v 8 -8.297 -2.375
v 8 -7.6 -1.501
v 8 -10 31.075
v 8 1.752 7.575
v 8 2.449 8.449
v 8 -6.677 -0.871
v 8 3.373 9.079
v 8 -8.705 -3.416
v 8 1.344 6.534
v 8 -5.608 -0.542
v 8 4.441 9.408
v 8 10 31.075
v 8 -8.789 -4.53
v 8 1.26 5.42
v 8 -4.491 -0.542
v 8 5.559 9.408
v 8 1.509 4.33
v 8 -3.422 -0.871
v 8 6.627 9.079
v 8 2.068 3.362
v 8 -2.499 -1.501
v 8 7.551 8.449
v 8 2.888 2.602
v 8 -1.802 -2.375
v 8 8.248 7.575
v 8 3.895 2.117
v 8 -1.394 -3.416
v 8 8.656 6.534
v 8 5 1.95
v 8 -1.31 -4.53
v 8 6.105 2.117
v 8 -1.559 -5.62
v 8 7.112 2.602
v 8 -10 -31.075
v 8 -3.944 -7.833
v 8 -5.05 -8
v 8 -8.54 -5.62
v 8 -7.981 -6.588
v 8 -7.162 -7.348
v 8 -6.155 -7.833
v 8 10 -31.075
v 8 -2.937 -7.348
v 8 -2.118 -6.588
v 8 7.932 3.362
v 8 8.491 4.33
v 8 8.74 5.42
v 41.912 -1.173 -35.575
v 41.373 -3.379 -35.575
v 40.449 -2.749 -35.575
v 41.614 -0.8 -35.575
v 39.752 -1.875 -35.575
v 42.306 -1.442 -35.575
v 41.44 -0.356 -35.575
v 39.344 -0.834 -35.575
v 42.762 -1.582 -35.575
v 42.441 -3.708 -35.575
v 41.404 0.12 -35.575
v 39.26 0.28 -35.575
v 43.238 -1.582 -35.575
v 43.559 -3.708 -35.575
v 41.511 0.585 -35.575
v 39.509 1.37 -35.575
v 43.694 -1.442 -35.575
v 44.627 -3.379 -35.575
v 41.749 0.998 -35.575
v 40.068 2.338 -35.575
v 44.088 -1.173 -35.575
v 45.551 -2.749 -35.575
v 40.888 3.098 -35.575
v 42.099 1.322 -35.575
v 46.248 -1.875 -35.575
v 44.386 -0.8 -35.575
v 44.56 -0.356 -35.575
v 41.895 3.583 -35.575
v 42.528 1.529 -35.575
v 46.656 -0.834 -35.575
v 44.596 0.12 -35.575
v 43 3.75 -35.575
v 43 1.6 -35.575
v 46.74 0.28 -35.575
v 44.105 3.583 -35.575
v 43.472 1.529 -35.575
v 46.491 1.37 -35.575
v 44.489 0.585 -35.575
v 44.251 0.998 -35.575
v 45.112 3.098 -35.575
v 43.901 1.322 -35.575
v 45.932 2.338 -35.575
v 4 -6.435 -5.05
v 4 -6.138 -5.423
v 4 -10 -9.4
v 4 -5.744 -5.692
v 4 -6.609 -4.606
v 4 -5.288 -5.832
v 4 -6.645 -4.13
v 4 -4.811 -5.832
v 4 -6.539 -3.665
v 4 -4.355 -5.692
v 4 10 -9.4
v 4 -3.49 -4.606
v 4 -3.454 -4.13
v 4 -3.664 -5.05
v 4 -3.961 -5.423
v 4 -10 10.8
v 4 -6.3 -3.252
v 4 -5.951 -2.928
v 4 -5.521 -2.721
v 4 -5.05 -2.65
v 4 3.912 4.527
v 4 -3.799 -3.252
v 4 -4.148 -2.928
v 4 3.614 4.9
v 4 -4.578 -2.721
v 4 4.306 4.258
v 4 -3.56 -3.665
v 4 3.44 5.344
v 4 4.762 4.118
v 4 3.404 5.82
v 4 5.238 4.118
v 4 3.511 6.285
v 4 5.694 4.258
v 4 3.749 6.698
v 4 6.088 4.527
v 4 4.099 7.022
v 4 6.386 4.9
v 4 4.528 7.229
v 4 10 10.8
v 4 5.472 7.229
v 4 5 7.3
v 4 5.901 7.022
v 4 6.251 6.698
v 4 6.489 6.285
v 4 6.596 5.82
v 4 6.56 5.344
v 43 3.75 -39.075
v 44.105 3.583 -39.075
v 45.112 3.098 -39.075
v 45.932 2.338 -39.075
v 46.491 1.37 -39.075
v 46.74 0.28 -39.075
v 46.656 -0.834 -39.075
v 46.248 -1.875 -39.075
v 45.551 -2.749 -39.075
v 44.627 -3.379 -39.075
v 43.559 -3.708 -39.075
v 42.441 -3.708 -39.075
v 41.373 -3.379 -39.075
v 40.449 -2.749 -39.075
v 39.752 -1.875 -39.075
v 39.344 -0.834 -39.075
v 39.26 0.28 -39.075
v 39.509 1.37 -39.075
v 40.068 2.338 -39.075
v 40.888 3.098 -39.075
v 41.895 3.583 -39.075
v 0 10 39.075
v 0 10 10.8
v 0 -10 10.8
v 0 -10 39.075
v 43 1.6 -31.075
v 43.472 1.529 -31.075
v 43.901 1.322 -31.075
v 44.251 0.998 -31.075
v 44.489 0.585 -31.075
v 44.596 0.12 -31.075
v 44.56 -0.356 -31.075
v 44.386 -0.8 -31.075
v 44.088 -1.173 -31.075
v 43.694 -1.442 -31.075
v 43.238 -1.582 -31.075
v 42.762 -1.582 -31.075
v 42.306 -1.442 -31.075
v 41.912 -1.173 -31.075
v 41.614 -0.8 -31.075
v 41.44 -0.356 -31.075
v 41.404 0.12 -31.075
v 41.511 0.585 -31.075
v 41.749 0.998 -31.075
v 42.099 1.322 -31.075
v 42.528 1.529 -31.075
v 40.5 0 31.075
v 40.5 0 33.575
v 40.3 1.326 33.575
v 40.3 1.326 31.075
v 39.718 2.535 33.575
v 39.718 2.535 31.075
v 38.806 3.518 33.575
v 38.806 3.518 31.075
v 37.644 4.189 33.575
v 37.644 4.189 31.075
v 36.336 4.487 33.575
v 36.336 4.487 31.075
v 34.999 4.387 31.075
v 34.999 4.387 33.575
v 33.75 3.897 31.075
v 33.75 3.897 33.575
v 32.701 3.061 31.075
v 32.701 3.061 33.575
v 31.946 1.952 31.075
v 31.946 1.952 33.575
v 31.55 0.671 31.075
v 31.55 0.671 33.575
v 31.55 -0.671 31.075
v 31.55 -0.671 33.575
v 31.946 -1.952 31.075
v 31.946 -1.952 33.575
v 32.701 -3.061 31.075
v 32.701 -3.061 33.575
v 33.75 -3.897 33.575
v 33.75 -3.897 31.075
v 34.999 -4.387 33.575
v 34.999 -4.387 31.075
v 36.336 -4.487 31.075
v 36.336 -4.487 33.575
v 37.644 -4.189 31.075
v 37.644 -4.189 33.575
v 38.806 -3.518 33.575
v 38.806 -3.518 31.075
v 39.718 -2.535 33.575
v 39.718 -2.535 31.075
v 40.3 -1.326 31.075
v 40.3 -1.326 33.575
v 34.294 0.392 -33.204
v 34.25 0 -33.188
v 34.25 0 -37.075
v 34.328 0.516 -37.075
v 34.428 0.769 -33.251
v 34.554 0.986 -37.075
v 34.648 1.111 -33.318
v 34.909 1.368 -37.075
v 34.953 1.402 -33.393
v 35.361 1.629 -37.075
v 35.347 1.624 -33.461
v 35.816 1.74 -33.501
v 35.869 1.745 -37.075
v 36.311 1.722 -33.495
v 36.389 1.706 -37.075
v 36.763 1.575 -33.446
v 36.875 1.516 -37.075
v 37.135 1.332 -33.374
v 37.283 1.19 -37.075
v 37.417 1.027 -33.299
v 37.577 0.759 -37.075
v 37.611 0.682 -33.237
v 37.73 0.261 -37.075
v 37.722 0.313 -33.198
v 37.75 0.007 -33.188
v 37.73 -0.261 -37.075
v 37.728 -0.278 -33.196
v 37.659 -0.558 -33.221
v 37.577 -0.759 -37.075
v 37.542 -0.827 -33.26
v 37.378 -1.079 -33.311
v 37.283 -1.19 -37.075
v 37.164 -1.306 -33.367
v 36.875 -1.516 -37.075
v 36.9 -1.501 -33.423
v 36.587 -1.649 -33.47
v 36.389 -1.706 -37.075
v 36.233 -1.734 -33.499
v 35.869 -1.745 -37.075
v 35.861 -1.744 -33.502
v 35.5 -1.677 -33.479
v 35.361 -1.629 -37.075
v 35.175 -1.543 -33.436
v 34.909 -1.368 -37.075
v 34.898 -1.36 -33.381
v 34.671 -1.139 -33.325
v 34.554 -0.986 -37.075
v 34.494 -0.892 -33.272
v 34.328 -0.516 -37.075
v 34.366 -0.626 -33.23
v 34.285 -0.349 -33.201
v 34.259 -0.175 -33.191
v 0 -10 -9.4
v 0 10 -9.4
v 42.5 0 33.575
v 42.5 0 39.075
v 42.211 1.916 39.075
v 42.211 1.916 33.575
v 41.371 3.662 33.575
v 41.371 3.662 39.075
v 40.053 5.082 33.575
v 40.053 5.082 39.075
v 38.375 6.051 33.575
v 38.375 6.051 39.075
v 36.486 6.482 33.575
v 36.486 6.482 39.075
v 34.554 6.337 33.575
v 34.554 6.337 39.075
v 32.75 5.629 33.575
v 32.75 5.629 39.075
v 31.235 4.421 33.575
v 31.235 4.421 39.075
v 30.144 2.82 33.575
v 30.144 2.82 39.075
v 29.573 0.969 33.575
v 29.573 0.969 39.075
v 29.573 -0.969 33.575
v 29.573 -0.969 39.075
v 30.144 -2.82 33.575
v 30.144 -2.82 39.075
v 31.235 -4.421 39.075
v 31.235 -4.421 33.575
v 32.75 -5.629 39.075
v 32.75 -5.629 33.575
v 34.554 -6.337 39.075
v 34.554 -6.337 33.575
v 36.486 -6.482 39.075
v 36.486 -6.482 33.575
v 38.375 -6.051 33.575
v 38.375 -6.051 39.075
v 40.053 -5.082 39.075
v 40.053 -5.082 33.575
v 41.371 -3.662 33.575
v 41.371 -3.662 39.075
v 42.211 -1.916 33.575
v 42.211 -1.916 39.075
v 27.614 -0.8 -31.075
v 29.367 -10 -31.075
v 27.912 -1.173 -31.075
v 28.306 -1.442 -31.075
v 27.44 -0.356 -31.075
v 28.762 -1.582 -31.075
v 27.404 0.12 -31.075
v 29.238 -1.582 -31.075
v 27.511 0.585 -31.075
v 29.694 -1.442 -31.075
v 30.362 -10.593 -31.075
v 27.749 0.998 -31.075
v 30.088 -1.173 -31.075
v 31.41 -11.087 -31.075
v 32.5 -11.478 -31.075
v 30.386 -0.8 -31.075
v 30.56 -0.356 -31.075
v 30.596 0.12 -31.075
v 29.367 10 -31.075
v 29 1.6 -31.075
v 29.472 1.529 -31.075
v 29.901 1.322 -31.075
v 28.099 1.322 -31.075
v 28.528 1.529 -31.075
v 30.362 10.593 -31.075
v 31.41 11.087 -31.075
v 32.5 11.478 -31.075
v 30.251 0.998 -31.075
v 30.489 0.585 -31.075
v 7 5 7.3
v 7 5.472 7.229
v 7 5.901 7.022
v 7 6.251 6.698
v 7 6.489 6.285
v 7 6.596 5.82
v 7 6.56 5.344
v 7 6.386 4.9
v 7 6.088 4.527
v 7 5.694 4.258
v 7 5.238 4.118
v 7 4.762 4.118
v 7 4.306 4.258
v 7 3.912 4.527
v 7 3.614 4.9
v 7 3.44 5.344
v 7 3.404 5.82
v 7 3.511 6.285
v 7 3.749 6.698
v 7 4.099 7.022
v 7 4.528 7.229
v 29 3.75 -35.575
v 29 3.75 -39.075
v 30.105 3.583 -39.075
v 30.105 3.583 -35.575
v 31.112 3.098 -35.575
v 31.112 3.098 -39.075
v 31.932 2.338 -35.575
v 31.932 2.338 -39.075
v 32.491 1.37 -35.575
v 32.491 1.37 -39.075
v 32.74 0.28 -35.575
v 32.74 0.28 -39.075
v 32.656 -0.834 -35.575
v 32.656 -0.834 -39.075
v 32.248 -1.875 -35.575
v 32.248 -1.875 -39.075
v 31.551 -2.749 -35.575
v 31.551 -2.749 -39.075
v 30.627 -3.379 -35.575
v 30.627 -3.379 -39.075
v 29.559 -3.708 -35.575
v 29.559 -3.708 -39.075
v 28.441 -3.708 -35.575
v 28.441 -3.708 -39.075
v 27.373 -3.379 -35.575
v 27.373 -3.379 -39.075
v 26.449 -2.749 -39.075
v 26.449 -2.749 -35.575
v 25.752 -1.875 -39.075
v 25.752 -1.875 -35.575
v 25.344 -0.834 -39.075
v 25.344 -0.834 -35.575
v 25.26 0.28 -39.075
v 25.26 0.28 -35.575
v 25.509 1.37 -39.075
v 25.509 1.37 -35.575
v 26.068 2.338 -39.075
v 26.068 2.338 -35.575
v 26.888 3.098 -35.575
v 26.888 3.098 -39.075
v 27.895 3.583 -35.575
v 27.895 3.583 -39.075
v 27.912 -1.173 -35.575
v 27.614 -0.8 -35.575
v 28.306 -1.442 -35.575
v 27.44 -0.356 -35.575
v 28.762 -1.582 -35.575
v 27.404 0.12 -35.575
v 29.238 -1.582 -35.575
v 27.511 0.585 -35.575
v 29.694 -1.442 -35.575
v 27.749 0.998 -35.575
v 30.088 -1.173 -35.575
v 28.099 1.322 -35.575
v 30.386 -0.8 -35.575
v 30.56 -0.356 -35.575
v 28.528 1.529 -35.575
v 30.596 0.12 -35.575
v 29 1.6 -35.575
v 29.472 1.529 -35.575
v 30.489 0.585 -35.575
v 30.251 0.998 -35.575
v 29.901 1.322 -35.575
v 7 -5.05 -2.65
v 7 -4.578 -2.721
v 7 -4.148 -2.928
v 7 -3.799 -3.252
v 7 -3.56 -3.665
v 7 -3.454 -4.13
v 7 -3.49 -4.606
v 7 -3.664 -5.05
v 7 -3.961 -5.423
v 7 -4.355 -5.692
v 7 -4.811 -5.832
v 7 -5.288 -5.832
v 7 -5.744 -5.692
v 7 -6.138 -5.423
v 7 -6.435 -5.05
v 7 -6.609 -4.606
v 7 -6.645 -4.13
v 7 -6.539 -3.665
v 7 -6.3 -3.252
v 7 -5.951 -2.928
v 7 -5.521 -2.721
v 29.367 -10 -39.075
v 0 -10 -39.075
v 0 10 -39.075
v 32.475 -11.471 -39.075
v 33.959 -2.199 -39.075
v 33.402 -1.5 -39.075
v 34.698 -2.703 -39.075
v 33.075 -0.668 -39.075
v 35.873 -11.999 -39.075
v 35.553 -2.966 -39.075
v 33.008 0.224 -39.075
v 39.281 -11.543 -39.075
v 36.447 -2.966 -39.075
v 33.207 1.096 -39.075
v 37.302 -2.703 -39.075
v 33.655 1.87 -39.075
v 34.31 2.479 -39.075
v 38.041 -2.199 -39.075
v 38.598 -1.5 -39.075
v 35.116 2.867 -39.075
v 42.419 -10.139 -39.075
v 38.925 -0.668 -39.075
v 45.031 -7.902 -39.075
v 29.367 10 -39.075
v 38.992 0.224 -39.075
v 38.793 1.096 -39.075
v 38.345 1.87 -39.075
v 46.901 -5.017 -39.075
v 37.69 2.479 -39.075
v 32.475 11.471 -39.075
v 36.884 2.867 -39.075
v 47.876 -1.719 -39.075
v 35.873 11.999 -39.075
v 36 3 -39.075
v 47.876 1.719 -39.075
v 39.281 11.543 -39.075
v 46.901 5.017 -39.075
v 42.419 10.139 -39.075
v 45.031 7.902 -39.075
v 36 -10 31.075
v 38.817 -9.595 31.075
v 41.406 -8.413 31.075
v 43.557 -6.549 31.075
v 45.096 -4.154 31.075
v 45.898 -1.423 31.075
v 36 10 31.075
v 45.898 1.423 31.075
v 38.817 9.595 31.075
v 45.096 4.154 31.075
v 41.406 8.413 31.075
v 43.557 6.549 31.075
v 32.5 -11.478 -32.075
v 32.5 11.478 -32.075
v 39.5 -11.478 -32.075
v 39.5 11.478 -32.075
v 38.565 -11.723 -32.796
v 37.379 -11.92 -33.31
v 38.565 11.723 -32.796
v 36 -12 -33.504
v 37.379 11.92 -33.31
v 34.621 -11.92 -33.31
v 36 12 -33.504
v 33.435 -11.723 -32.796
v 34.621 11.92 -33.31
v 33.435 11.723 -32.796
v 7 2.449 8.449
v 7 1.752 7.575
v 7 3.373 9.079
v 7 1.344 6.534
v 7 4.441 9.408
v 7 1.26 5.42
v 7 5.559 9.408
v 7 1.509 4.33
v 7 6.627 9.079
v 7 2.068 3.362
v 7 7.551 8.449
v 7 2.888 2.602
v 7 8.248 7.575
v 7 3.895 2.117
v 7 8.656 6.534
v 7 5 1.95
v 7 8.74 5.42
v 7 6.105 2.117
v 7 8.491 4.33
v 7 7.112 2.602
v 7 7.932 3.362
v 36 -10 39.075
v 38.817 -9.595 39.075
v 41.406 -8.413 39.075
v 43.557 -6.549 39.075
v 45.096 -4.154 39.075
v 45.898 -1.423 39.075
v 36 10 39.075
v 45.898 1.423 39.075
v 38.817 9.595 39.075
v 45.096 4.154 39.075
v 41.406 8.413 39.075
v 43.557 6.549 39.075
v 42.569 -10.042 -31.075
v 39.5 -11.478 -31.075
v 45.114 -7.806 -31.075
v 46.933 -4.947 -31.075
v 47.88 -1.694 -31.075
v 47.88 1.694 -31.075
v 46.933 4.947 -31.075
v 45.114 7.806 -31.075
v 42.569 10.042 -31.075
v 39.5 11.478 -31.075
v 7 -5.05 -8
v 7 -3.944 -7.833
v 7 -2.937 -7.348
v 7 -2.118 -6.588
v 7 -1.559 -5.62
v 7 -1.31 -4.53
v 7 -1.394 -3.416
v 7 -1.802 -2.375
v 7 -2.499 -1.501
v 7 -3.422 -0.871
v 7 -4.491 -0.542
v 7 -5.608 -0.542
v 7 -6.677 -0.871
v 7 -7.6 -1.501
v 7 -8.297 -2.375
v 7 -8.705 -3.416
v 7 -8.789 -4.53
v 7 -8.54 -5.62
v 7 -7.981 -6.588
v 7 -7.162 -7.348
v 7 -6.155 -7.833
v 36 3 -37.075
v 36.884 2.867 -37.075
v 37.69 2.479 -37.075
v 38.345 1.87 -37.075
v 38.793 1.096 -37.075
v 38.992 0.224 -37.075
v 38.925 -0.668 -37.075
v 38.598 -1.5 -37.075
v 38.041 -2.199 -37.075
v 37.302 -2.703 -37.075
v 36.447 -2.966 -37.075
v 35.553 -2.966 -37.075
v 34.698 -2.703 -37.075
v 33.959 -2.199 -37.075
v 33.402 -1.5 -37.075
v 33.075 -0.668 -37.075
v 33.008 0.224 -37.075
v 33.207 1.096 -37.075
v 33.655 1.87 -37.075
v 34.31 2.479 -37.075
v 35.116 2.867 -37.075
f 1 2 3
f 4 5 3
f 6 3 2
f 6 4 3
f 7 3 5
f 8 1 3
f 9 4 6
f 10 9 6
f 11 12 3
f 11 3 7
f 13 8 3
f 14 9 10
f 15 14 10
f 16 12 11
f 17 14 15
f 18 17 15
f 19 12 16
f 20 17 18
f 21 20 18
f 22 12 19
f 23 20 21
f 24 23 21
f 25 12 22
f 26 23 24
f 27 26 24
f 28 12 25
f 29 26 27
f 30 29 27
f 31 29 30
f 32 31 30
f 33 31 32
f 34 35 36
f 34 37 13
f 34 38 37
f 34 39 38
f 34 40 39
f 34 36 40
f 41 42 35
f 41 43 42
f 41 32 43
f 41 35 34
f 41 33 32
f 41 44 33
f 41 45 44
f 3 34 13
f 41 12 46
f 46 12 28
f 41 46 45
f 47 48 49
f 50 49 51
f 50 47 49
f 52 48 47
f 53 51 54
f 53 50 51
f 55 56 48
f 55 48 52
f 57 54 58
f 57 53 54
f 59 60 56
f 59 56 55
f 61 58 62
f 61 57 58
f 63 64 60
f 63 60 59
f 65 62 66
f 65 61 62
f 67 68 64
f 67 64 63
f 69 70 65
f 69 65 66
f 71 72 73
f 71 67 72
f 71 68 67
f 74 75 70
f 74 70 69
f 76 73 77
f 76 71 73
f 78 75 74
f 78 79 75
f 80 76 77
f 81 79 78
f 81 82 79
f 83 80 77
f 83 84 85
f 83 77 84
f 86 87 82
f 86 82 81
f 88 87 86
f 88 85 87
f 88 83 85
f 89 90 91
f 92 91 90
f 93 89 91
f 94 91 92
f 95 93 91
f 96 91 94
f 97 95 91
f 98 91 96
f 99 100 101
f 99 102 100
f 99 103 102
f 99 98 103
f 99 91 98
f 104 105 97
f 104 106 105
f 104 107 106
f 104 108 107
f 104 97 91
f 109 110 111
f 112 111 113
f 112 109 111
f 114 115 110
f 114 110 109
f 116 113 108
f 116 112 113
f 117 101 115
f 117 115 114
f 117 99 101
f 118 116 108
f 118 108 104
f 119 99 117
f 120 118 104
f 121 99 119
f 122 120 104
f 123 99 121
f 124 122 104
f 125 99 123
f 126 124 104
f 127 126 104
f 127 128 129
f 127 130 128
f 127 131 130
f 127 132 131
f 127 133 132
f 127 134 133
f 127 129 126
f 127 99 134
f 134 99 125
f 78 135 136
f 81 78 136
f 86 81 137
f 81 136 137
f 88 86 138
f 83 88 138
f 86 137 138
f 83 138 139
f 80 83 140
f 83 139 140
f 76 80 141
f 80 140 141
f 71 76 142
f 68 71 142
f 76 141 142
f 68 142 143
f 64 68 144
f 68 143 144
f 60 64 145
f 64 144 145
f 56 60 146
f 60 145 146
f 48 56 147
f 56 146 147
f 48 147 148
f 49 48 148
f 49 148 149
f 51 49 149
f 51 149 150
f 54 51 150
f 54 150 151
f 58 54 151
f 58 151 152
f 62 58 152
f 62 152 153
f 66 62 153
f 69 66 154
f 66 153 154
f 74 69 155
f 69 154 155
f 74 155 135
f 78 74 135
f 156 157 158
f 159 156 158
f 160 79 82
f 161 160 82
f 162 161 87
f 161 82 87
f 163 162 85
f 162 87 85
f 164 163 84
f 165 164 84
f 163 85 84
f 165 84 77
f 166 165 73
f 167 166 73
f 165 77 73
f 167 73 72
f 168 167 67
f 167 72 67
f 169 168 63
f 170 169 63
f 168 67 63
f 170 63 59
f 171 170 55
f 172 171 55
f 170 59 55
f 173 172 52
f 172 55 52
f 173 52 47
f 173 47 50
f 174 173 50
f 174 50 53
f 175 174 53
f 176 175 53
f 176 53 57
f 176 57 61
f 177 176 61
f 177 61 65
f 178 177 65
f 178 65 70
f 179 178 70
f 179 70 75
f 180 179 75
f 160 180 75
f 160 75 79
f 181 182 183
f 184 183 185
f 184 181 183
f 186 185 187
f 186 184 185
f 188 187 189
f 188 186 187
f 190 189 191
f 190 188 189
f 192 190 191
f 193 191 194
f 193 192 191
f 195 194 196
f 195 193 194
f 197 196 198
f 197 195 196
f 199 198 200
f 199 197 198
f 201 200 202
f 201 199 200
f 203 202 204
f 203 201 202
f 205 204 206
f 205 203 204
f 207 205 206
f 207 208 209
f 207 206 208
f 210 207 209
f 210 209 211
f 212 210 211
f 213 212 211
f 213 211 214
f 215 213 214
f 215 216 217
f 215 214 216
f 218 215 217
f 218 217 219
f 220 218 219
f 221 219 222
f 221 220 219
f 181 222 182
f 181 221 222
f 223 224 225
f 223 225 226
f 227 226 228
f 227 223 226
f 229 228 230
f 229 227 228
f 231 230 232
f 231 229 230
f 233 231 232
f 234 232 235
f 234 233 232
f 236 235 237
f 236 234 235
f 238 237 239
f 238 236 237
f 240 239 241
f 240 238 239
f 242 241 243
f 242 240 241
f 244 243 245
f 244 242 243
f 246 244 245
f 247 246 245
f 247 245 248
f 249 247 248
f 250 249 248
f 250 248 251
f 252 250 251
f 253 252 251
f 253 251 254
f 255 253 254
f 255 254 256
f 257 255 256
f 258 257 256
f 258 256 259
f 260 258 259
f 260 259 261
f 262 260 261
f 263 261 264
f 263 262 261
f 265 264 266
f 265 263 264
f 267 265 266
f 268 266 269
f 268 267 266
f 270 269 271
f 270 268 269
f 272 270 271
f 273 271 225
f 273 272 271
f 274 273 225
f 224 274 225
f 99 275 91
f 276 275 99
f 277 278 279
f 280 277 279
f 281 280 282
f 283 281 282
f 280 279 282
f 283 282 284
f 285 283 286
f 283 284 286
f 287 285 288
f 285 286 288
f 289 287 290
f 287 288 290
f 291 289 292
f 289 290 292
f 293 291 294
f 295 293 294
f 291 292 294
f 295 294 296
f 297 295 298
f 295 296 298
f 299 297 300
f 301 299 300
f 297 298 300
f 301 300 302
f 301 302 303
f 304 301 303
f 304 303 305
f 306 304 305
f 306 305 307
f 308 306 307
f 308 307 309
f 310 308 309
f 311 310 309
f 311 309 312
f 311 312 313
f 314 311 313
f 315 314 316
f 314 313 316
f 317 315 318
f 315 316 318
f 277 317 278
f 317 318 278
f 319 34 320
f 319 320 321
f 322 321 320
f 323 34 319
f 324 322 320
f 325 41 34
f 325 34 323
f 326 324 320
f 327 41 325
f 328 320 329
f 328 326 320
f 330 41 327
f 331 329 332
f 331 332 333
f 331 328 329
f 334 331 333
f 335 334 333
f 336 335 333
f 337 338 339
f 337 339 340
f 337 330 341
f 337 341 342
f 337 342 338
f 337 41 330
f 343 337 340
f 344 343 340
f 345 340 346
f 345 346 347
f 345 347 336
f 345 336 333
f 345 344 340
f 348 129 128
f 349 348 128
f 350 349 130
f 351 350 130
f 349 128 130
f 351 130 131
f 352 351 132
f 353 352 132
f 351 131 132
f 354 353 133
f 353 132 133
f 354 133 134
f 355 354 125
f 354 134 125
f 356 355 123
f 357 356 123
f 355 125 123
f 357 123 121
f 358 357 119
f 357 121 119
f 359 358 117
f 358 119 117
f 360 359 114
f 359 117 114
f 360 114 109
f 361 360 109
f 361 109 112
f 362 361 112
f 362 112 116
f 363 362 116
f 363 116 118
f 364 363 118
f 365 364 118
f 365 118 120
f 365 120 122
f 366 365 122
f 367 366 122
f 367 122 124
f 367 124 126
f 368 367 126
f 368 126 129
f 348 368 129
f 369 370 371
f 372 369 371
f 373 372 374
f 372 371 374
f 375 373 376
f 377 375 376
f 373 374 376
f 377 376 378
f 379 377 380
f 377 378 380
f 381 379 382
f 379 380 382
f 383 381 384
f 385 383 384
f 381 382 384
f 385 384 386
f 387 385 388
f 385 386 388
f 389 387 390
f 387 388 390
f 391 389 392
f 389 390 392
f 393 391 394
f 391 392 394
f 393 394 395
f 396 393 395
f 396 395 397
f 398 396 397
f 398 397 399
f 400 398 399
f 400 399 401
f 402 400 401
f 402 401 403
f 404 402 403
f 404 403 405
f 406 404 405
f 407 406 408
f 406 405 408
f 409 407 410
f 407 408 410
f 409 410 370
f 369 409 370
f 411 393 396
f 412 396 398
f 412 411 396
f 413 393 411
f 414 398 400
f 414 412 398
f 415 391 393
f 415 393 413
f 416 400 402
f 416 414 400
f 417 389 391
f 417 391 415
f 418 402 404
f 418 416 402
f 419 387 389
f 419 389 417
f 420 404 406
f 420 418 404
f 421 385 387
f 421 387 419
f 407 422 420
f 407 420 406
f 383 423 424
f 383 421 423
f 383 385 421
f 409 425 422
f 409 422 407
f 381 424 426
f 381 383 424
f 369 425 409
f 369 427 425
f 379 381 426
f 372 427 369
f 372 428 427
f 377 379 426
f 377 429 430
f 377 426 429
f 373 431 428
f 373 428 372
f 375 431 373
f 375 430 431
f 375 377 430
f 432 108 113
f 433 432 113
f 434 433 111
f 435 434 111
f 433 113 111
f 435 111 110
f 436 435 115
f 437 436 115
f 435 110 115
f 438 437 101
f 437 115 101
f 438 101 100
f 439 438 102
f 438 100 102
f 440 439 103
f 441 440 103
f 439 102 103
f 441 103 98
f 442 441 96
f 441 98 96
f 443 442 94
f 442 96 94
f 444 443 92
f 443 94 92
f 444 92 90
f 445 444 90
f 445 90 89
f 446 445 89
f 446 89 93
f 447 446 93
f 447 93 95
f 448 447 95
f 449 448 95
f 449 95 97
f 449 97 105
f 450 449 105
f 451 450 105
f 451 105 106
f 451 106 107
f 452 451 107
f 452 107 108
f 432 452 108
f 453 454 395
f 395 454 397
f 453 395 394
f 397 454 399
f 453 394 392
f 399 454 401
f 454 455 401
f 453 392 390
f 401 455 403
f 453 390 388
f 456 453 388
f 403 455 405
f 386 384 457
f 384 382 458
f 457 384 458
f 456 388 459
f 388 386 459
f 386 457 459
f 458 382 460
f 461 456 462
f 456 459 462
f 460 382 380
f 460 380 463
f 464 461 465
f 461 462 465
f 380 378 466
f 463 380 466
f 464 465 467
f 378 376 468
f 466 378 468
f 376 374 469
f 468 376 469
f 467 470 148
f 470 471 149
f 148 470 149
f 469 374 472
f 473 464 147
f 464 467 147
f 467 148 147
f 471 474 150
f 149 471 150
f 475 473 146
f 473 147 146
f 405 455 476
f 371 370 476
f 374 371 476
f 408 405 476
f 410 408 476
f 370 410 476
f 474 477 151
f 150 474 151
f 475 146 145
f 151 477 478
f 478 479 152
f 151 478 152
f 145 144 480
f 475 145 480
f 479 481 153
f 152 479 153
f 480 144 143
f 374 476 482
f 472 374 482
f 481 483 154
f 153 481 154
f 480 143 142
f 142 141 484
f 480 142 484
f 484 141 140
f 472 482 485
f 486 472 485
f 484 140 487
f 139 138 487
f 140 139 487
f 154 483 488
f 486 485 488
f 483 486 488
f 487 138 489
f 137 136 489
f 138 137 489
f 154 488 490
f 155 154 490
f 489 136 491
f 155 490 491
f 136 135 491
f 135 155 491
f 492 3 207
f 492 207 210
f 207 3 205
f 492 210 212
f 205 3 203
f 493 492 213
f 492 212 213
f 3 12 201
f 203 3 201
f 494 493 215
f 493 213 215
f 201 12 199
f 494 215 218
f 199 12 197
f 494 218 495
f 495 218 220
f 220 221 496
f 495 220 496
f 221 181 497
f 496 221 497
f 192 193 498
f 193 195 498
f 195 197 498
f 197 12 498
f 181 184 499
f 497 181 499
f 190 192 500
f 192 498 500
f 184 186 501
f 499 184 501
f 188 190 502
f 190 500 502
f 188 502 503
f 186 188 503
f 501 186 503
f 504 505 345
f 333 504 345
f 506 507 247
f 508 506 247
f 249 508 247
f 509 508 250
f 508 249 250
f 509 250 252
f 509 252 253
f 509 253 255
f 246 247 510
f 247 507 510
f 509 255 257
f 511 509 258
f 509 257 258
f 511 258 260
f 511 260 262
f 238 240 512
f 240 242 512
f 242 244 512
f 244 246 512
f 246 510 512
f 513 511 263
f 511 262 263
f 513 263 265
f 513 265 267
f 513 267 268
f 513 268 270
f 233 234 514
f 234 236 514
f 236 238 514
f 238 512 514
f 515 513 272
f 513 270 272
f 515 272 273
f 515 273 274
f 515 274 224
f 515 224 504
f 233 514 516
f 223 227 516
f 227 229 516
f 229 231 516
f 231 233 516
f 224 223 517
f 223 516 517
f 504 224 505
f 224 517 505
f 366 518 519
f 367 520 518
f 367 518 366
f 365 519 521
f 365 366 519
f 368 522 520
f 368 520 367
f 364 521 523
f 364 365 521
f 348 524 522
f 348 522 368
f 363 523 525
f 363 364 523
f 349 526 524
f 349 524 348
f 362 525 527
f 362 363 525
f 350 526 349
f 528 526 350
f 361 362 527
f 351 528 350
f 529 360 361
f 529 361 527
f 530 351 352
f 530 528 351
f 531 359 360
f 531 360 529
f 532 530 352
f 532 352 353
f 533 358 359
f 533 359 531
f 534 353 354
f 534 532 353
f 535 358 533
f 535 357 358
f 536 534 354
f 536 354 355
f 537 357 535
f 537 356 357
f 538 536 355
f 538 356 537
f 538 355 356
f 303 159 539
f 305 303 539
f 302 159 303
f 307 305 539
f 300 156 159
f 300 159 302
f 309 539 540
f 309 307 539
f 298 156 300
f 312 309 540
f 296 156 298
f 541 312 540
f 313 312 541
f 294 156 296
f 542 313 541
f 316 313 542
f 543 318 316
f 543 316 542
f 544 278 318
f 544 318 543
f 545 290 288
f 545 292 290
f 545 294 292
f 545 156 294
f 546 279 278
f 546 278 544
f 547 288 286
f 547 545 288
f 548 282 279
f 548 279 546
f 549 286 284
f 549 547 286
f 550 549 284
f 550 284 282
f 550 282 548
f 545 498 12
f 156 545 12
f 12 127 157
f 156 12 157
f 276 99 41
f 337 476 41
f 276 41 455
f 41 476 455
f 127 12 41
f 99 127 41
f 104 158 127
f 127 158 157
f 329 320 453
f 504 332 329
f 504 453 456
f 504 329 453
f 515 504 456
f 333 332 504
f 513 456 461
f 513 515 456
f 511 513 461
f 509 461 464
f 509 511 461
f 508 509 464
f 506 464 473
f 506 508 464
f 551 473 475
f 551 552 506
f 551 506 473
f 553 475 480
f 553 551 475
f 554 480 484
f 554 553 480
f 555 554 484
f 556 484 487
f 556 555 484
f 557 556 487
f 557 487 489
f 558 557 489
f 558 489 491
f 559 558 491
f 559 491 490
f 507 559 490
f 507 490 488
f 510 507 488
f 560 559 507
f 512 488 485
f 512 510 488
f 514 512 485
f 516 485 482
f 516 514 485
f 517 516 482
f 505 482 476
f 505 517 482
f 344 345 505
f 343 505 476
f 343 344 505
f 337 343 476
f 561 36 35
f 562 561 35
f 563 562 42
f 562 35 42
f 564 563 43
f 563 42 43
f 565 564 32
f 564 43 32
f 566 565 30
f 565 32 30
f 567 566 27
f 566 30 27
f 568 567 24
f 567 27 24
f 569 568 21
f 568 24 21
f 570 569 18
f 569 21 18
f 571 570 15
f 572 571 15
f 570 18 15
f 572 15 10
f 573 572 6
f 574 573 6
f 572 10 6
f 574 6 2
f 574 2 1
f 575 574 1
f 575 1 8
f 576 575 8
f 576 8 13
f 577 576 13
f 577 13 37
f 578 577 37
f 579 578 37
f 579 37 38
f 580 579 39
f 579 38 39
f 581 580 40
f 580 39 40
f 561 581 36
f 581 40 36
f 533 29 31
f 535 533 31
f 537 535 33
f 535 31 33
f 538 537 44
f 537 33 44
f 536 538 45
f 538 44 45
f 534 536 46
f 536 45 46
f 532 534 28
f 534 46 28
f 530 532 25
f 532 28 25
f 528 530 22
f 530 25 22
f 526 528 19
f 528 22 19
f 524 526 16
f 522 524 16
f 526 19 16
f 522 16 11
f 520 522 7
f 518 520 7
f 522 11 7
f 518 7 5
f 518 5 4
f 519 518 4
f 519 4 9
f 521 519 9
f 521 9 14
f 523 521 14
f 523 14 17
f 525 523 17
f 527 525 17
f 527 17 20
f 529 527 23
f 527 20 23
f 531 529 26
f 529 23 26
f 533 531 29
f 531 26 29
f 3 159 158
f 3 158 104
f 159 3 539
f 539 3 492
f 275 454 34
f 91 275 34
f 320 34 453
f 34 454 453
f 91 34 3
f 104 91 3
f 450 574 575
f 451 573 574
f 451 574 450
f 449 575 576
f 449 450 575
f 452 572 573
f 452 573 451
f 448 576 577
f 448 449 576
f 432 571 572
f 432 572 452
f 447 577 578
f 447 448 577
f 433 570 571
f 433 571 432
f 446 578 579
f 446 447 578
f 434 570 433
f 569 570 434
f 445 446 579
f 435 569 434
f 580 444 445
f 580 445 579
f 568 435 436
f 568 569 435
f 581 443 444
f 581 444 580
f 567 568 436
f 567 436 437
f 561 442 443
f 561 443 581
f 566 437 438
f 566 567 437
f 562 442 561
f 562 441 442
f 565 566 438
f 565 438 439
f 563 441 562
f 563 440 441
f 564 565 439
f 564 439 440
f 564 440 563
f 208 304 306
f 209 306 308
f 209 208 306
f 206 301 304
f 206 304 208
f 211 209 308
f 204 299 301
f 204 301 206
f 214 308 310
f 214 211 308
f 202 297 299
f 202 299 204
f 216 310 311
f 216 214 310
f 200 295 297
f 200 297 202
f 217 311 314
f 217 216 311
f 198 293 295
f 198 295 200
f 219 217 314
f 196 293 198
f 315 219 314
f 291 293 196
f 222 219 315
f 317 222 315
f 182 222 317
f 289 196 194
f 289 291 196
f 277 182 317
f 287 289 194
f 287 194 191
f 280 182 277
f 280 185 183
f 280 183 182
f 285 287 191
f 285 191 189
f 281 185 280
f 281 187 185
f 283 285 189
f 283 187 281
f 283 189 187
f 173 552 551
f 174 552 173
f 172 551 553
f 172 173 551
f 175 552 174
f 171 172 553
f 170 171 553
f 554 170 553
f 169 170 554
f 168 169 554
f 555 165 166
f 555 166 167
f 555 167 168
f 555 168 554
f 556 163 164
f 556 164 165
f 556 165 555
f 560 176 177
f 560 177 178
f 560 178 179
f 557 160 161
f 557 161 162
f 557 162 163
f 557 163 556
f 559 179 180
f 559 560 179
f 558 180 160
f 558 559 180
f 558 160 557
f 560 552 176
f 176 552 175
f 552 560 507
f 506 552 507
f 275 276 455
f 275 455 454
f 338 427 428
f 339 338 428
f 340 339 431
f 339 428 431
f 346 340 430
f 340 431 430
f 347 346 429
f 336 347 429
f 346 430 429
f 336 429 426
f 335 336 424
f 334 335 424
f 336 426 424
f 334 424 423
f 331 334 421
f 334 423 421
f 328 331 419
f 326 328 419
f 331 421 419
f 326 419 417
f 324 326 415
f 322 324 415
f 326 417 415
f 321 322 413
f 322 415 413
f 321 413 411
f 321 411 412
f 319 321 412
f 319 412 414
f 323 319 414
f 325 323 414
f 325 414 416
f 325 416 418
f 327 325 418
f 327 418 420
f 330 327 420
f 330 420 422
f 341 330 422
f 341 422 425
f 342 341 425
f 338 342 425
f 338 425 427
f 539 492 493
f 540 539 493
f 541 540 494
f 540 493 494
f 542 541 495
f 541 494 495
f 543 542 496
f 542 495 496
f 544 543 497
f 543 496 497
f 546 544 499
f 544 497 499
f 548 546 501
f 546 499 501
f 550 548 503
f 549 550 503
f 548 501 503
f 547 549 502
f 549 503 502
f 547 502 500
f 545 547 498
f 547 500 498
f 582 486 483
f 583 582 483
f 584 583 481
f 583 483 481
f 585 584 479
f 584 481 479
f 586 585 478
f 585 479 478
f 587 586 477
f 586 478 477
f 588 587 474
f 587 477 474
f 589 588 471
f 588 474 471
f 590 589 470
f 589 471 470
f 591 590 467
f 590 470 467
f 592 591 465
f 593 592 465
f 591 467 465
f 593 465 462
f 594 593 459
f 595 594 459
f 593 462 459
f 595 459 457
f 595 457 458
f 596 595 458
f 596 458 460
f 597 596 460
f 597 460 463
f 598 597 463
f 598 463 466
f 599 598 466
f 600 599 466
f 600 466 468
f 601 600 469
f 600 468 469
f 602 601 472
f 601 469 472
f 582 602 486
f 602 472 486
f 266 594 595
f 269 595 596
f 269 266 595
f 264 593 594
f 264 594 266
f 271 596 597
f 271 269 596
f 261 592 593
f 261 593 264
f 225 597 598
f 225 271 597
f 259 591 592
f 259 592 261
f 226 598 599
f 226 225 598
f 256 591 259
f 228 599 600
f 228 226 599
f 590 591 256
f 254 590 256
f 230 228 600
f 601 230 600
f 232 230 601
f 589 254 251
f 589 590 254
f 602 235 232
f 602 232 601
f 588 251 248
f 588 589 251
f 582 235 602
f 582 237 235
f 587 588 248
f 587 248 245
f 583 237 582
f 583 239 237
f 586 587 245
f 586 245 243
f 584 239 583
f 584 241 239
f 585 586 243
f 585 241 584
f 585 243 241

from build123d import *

# Parameters (mm, degrees)
SZKIC25_W                        = 62.15
SZKIC25_H                        = 20
DODANIE_WYCI_GNI_CIE7_DEPTH      = 8
SZKIC14_R                        = 1.75
DODANIE_WYCI_GNI_CIE5_DEPTH      = 8
SZKIC16_R                        = 4.5
DODANIE_WYCI_GNI_CIE6_DEPTH      = 8
SZKIC19_R                        = 6.5
WYTNIJ_WYCI_GNI_CIE8_DEPTH       = 5.5
WYTNIJ_WYCI_GNI_CIE9_REACH       = 94.496
SZKIC20_R                        = 1.6
SZKIC21_R                        = 3.75
WYTNIJ_WYCI_GNI_CIE10_DEPTH      = 3.5
SZKIC22_R                        = 3
WYTNIJ_WYCI_GNI_CIE11_DEPTH      = 2
WYTNIJ_WYCI_GNI_CIE12_REACH      = 68.384
WYTNIJ_WYCI_GNI_CIE12_END_RADIUS = 12
SZKIC26_W                        = 20.2
SZKIC26_H                        = 20
WYTNIJ_WYCI_GNI_CIE13_DEPTH      = 4
WYTNIJ_WYCI_GNI_CIE14_REACH      = 62.057
SZKIC27_R                        = 1.6
SZKIC28_R                        = 3.75
WYTNIJ_WYCI_GNI_CIE15_DEPTH      = 1


with BuildPart() as part:
    # Szkic25 → Dodanie-wyciągnięcie7 (new body)
    with BuildSketch(Plane(origin=(0, 0, 0), x_dir=(0, 0, -1), z_dir=(1, 0, 0))):
        Rectangle(SZKIC25_W, SZKIC25_H)
    extrude(amount=DODANIE_WYCI_GNI_CIE7_DEPTH)

    # Szkic14 → Dodanie-wyciągnięcie5 (add)
    with BuildSketch(Plane(origin=(0, 0, -31.075), x_dir=(-1, 0, 0), z_dir=(0, 0, -1))):
        with BuildLine():
            Line((0, 10), (0, -10))
            Line((0, -10), (-29.366750419, -10))
            ThreePointArc((-29.366750419, -10), (-48, 0), (-29.366750419, 10))
            Line((-29.366750419, 10), (0, 10))
        make_face()
        with Locations((-36, 0)):
            Circle(SZKIC14_R, mode=Mode.SUBTRACT)
    extrude(amount=DODANIE_WYCI_GNI_CIE5_DEPTH)

    # Szkic16 → Dodanie-wyciągnięcie6 (add)
    with BuildSketch(Plane.XY.offset(31.075)):
        with BuildLine():
            Line((0, 10), (0, -10))
            Line((0, -10), (36, -10))
            ThreePointArc((36, -10), (46, 0), (36, 10))
            Line((36, 10), (0, 10))
        make_face()
        with Locations((36, 0)):
            Circle(SZKIC16_R, mode=Mode.SUBTRACT)
    extrude(amount=DODANIE_WYCI_GNI_CIE6_DEPTH)

    # Szkic19 → Wytnij-wyciągnięcie8 (cut)
    with BuildSketch(Plane.XY.offset(39.075)):
        with Locations((36, 0)):
            Circle(SZKIC19_R)
    extrude(amount=-WYTNIJ_WYCI_GNI_CIE8_DEPTH, mode=Mode.SUBTRACT)

    # Szkic20 → Wytnij-wyciągnięcie9 (cut, up to next)
    with BuildSketch(Plane(origin=(0, 0, -39.075), x_dir=(-1, 0, 0), z_dir=(0, 0, -1)), mode=Mode.PRIVATE) as wytnij_wyci_gni_cie9_sk1:
        with Locations(Location((-29, 0, 0), (0, 0, 90))):
            Circle(SZKIC20_R)
    wytnij_wyci_gni_cie9_tool1 = extrude(wytnij_wyci_gni_cie9_sk1.sketch, amount=-WYTNIJ_WYCI_GNI_CIE9_REACH, mode=Mode.PRIVATE) & part.part
    # Szkic20 → Wytnij-wyciągnięcie9 (cut, up to next)
    with BuildSketch(Plane(origin=(0, 0, -39.075), x_dir=(-1, 0, 0), z_dir=(0, 0, -1)), mode=Mode.PRIVATE) as wytnij_wyci_gni_cie9_sk2:
        with Locations(Location((-43, 0, 0), (0, 0, 90))):
            Circle(SZKIC20_R)
    wytnij_wyci_gni_cie9_tool2 = extrude(wytnij_wyci_gni_cie9_sk2.sketch, amount=-WYTNIJ_WYCI_GNI_CIE9_REACH, mode=Mode.PRIVATE) & part.part
    add(wytnij_wyci_gni_cie9_tool1.solids().sort_by_distance((29, 0, -39.075))[0], mode=Mode.SUBTRACT)
    add(wytnij_wyci_gni_cie9_tool2.solids().sort_by_distance((43, 0, -39.075))[0], mode=Mode.SUBTRACT)

    # Szkic21 → Wytnij-wyciągnięcie10 (cut)
    with BuildSketch(Plane(origin=(0, 0, -39.075), x_dir=(-1, 0, 0), z_dir=(0, 0, -1))):
        with Locations(Location((-43, 0, 0), (0, 0, 90))):
            Circle(SZKIC21_R)
        with Locations(Location((-29, 0, 0), (0, 0, 90))):
            Circle(SZKIC21_R)
    extrude(amount=-WYTNIJ_WYCI_GNI_CIE10_DEPTH, mode=Mode.SUBTRACT)

    # Szkic22 → Wytnij-wyciągnięcie11 (cut)
    with BuildSketch(Plane(origin=(0, 0, -39.075), x_dir=(-1, 0, 0), z_dir=(0, 0, -1))):
        with Locations(Location((-36, 0, 0), (0, 0, 90))):
            Circle(SZKIC22_R)
    extrude(amount=-WYTNIJ_WYCI_GNI_CIE11_DEPTH, mode=Mode.SUBTRACT)

    # Wytnij-wyciągnięcie12: up to this cylinder (the profile starts inside it)
    wytnij_wyci_gni_cie12_end = Plane(origin=(36, 0, -32.110303), z_dir=(0, 0, 1)) * Cylinder(WYTNIJ_WYCI_GNI_CIE12_END_RADIUS, 161.768, mode=Mode.PRIVATE)
    # Szkic23 → Wytnij-wyciągnięcie12 (cut, up to the surface)
    with BuildSketch(Plane(origin=(0, 12, 0), x_dir=(1, 0, 0), z_dir=(0, 1, 0)), mode=Mode.PRIVATE) as wytnij_wyci_gni_cie12_sk1:
        with BuildLine():
            Line((32.5, 31.075), (39.5, 31.075))
            Line((39.5, 31.075), (39.5, 32.075))
            ThreePointArc((39.5, 32.075), (36, 33.504285786), (32.5, 32.075))
            Line((32.5, 32.075), (32.5, 31.075))
        make_face()
    wytnij_wyci_gni_cie12_tool1 = extrude(wytnij_wyci_gni_cie12_sk1.sketch, amount=-WYTNIJ_WYCI_GNI_CIE12_REACH, mode=Mode.PRIVATE) & wytnij_wyci_gni_cie12_end
    add(wytnij_wyci_gni_cie12_tool1.solids().sort_by_distance((36, 12, -32.110303))[0], mode=Mode.SUBTRACT)

    # Szkic26 → Wytnij-wyciągnięcie13 (cut)
    with BuildSketch(Plane.ZY):
        with Locations((0.7, 0)):
            Rectangle(SZKIC26_W, SZKIC26_H)
    extrude(amount=-WYTNIJ_WYCI_GNI_CIE13_DEPTH, mode=Mode.SUBTRACT)

    # Szkic27 → Wytnij-wyciągnięcie14 (cut, up to next)
    with BuildSketch(Plane.ZY.offset(-4), mode=Mode.PRIVATE) as wytnij_wyci_gni_cie14_sk1:
        with Locations((5.7, 5)):
            Circle(SZKIC27_R)
    wytnij_wyci_gni_cie14_tool1 = extrude(wytnij_wyci_gni_cie14_sk1.sketch, amount=-WYTNIJ_WYCI_GNI_CIE14_REACH, mode=Mode.PRIVATE) & part.part
    # Szkic27 → Wytnij-wyciągnięcie14 (cut, up to next)
    with BuildSketch(Plane.ZY.offset(-4), mode=Mode.PRIVATE) as wytnij_wyci_gni_cie14_sk2:
        with Locations((-4.250002475, -5.0495025)):
            Circle(SZKIC27_R)
    wytnij_wyci_gni_cie14_tool2 = extrude(wytnij_wyci_gni_cie14_sk2.sketch, amount=-WYTNIJ_WYCI_GNI_CIE14_REACH, mode=Mode.PRIVATE) & part.part
    add(wytnij_wyci_gni_cie14_tool1.solids().sort_by_distance((4, 5, 5.7))[0], mode=Mode.SUBTRACT)
    add(wytnij_wyci_gni_cie14_tool2.solids().sort_by_distance((4, -5.049502, -4.250002))[0], mode=Mode.SUBTRACT)

    # Szkic28 → Wytnij-wyciągnięcie15 (cut)
    with BuildSketch(Plane(origin=(8, 0, 0), x_dir=(0, 0, -1), z_dir=(1, 0, 0))):
        with Locations((-5.7, 5)):
            Circle(SZKIC28_R)
        with Locations((4.250002475, -5.0495025)):
            Circle(SZKIC28_R)
    extrude(amount=-WYTNIJ_WYCI_GNI_CIE15_DEPTH, mode=Mode.SUBTRACT)


solid = part.part
